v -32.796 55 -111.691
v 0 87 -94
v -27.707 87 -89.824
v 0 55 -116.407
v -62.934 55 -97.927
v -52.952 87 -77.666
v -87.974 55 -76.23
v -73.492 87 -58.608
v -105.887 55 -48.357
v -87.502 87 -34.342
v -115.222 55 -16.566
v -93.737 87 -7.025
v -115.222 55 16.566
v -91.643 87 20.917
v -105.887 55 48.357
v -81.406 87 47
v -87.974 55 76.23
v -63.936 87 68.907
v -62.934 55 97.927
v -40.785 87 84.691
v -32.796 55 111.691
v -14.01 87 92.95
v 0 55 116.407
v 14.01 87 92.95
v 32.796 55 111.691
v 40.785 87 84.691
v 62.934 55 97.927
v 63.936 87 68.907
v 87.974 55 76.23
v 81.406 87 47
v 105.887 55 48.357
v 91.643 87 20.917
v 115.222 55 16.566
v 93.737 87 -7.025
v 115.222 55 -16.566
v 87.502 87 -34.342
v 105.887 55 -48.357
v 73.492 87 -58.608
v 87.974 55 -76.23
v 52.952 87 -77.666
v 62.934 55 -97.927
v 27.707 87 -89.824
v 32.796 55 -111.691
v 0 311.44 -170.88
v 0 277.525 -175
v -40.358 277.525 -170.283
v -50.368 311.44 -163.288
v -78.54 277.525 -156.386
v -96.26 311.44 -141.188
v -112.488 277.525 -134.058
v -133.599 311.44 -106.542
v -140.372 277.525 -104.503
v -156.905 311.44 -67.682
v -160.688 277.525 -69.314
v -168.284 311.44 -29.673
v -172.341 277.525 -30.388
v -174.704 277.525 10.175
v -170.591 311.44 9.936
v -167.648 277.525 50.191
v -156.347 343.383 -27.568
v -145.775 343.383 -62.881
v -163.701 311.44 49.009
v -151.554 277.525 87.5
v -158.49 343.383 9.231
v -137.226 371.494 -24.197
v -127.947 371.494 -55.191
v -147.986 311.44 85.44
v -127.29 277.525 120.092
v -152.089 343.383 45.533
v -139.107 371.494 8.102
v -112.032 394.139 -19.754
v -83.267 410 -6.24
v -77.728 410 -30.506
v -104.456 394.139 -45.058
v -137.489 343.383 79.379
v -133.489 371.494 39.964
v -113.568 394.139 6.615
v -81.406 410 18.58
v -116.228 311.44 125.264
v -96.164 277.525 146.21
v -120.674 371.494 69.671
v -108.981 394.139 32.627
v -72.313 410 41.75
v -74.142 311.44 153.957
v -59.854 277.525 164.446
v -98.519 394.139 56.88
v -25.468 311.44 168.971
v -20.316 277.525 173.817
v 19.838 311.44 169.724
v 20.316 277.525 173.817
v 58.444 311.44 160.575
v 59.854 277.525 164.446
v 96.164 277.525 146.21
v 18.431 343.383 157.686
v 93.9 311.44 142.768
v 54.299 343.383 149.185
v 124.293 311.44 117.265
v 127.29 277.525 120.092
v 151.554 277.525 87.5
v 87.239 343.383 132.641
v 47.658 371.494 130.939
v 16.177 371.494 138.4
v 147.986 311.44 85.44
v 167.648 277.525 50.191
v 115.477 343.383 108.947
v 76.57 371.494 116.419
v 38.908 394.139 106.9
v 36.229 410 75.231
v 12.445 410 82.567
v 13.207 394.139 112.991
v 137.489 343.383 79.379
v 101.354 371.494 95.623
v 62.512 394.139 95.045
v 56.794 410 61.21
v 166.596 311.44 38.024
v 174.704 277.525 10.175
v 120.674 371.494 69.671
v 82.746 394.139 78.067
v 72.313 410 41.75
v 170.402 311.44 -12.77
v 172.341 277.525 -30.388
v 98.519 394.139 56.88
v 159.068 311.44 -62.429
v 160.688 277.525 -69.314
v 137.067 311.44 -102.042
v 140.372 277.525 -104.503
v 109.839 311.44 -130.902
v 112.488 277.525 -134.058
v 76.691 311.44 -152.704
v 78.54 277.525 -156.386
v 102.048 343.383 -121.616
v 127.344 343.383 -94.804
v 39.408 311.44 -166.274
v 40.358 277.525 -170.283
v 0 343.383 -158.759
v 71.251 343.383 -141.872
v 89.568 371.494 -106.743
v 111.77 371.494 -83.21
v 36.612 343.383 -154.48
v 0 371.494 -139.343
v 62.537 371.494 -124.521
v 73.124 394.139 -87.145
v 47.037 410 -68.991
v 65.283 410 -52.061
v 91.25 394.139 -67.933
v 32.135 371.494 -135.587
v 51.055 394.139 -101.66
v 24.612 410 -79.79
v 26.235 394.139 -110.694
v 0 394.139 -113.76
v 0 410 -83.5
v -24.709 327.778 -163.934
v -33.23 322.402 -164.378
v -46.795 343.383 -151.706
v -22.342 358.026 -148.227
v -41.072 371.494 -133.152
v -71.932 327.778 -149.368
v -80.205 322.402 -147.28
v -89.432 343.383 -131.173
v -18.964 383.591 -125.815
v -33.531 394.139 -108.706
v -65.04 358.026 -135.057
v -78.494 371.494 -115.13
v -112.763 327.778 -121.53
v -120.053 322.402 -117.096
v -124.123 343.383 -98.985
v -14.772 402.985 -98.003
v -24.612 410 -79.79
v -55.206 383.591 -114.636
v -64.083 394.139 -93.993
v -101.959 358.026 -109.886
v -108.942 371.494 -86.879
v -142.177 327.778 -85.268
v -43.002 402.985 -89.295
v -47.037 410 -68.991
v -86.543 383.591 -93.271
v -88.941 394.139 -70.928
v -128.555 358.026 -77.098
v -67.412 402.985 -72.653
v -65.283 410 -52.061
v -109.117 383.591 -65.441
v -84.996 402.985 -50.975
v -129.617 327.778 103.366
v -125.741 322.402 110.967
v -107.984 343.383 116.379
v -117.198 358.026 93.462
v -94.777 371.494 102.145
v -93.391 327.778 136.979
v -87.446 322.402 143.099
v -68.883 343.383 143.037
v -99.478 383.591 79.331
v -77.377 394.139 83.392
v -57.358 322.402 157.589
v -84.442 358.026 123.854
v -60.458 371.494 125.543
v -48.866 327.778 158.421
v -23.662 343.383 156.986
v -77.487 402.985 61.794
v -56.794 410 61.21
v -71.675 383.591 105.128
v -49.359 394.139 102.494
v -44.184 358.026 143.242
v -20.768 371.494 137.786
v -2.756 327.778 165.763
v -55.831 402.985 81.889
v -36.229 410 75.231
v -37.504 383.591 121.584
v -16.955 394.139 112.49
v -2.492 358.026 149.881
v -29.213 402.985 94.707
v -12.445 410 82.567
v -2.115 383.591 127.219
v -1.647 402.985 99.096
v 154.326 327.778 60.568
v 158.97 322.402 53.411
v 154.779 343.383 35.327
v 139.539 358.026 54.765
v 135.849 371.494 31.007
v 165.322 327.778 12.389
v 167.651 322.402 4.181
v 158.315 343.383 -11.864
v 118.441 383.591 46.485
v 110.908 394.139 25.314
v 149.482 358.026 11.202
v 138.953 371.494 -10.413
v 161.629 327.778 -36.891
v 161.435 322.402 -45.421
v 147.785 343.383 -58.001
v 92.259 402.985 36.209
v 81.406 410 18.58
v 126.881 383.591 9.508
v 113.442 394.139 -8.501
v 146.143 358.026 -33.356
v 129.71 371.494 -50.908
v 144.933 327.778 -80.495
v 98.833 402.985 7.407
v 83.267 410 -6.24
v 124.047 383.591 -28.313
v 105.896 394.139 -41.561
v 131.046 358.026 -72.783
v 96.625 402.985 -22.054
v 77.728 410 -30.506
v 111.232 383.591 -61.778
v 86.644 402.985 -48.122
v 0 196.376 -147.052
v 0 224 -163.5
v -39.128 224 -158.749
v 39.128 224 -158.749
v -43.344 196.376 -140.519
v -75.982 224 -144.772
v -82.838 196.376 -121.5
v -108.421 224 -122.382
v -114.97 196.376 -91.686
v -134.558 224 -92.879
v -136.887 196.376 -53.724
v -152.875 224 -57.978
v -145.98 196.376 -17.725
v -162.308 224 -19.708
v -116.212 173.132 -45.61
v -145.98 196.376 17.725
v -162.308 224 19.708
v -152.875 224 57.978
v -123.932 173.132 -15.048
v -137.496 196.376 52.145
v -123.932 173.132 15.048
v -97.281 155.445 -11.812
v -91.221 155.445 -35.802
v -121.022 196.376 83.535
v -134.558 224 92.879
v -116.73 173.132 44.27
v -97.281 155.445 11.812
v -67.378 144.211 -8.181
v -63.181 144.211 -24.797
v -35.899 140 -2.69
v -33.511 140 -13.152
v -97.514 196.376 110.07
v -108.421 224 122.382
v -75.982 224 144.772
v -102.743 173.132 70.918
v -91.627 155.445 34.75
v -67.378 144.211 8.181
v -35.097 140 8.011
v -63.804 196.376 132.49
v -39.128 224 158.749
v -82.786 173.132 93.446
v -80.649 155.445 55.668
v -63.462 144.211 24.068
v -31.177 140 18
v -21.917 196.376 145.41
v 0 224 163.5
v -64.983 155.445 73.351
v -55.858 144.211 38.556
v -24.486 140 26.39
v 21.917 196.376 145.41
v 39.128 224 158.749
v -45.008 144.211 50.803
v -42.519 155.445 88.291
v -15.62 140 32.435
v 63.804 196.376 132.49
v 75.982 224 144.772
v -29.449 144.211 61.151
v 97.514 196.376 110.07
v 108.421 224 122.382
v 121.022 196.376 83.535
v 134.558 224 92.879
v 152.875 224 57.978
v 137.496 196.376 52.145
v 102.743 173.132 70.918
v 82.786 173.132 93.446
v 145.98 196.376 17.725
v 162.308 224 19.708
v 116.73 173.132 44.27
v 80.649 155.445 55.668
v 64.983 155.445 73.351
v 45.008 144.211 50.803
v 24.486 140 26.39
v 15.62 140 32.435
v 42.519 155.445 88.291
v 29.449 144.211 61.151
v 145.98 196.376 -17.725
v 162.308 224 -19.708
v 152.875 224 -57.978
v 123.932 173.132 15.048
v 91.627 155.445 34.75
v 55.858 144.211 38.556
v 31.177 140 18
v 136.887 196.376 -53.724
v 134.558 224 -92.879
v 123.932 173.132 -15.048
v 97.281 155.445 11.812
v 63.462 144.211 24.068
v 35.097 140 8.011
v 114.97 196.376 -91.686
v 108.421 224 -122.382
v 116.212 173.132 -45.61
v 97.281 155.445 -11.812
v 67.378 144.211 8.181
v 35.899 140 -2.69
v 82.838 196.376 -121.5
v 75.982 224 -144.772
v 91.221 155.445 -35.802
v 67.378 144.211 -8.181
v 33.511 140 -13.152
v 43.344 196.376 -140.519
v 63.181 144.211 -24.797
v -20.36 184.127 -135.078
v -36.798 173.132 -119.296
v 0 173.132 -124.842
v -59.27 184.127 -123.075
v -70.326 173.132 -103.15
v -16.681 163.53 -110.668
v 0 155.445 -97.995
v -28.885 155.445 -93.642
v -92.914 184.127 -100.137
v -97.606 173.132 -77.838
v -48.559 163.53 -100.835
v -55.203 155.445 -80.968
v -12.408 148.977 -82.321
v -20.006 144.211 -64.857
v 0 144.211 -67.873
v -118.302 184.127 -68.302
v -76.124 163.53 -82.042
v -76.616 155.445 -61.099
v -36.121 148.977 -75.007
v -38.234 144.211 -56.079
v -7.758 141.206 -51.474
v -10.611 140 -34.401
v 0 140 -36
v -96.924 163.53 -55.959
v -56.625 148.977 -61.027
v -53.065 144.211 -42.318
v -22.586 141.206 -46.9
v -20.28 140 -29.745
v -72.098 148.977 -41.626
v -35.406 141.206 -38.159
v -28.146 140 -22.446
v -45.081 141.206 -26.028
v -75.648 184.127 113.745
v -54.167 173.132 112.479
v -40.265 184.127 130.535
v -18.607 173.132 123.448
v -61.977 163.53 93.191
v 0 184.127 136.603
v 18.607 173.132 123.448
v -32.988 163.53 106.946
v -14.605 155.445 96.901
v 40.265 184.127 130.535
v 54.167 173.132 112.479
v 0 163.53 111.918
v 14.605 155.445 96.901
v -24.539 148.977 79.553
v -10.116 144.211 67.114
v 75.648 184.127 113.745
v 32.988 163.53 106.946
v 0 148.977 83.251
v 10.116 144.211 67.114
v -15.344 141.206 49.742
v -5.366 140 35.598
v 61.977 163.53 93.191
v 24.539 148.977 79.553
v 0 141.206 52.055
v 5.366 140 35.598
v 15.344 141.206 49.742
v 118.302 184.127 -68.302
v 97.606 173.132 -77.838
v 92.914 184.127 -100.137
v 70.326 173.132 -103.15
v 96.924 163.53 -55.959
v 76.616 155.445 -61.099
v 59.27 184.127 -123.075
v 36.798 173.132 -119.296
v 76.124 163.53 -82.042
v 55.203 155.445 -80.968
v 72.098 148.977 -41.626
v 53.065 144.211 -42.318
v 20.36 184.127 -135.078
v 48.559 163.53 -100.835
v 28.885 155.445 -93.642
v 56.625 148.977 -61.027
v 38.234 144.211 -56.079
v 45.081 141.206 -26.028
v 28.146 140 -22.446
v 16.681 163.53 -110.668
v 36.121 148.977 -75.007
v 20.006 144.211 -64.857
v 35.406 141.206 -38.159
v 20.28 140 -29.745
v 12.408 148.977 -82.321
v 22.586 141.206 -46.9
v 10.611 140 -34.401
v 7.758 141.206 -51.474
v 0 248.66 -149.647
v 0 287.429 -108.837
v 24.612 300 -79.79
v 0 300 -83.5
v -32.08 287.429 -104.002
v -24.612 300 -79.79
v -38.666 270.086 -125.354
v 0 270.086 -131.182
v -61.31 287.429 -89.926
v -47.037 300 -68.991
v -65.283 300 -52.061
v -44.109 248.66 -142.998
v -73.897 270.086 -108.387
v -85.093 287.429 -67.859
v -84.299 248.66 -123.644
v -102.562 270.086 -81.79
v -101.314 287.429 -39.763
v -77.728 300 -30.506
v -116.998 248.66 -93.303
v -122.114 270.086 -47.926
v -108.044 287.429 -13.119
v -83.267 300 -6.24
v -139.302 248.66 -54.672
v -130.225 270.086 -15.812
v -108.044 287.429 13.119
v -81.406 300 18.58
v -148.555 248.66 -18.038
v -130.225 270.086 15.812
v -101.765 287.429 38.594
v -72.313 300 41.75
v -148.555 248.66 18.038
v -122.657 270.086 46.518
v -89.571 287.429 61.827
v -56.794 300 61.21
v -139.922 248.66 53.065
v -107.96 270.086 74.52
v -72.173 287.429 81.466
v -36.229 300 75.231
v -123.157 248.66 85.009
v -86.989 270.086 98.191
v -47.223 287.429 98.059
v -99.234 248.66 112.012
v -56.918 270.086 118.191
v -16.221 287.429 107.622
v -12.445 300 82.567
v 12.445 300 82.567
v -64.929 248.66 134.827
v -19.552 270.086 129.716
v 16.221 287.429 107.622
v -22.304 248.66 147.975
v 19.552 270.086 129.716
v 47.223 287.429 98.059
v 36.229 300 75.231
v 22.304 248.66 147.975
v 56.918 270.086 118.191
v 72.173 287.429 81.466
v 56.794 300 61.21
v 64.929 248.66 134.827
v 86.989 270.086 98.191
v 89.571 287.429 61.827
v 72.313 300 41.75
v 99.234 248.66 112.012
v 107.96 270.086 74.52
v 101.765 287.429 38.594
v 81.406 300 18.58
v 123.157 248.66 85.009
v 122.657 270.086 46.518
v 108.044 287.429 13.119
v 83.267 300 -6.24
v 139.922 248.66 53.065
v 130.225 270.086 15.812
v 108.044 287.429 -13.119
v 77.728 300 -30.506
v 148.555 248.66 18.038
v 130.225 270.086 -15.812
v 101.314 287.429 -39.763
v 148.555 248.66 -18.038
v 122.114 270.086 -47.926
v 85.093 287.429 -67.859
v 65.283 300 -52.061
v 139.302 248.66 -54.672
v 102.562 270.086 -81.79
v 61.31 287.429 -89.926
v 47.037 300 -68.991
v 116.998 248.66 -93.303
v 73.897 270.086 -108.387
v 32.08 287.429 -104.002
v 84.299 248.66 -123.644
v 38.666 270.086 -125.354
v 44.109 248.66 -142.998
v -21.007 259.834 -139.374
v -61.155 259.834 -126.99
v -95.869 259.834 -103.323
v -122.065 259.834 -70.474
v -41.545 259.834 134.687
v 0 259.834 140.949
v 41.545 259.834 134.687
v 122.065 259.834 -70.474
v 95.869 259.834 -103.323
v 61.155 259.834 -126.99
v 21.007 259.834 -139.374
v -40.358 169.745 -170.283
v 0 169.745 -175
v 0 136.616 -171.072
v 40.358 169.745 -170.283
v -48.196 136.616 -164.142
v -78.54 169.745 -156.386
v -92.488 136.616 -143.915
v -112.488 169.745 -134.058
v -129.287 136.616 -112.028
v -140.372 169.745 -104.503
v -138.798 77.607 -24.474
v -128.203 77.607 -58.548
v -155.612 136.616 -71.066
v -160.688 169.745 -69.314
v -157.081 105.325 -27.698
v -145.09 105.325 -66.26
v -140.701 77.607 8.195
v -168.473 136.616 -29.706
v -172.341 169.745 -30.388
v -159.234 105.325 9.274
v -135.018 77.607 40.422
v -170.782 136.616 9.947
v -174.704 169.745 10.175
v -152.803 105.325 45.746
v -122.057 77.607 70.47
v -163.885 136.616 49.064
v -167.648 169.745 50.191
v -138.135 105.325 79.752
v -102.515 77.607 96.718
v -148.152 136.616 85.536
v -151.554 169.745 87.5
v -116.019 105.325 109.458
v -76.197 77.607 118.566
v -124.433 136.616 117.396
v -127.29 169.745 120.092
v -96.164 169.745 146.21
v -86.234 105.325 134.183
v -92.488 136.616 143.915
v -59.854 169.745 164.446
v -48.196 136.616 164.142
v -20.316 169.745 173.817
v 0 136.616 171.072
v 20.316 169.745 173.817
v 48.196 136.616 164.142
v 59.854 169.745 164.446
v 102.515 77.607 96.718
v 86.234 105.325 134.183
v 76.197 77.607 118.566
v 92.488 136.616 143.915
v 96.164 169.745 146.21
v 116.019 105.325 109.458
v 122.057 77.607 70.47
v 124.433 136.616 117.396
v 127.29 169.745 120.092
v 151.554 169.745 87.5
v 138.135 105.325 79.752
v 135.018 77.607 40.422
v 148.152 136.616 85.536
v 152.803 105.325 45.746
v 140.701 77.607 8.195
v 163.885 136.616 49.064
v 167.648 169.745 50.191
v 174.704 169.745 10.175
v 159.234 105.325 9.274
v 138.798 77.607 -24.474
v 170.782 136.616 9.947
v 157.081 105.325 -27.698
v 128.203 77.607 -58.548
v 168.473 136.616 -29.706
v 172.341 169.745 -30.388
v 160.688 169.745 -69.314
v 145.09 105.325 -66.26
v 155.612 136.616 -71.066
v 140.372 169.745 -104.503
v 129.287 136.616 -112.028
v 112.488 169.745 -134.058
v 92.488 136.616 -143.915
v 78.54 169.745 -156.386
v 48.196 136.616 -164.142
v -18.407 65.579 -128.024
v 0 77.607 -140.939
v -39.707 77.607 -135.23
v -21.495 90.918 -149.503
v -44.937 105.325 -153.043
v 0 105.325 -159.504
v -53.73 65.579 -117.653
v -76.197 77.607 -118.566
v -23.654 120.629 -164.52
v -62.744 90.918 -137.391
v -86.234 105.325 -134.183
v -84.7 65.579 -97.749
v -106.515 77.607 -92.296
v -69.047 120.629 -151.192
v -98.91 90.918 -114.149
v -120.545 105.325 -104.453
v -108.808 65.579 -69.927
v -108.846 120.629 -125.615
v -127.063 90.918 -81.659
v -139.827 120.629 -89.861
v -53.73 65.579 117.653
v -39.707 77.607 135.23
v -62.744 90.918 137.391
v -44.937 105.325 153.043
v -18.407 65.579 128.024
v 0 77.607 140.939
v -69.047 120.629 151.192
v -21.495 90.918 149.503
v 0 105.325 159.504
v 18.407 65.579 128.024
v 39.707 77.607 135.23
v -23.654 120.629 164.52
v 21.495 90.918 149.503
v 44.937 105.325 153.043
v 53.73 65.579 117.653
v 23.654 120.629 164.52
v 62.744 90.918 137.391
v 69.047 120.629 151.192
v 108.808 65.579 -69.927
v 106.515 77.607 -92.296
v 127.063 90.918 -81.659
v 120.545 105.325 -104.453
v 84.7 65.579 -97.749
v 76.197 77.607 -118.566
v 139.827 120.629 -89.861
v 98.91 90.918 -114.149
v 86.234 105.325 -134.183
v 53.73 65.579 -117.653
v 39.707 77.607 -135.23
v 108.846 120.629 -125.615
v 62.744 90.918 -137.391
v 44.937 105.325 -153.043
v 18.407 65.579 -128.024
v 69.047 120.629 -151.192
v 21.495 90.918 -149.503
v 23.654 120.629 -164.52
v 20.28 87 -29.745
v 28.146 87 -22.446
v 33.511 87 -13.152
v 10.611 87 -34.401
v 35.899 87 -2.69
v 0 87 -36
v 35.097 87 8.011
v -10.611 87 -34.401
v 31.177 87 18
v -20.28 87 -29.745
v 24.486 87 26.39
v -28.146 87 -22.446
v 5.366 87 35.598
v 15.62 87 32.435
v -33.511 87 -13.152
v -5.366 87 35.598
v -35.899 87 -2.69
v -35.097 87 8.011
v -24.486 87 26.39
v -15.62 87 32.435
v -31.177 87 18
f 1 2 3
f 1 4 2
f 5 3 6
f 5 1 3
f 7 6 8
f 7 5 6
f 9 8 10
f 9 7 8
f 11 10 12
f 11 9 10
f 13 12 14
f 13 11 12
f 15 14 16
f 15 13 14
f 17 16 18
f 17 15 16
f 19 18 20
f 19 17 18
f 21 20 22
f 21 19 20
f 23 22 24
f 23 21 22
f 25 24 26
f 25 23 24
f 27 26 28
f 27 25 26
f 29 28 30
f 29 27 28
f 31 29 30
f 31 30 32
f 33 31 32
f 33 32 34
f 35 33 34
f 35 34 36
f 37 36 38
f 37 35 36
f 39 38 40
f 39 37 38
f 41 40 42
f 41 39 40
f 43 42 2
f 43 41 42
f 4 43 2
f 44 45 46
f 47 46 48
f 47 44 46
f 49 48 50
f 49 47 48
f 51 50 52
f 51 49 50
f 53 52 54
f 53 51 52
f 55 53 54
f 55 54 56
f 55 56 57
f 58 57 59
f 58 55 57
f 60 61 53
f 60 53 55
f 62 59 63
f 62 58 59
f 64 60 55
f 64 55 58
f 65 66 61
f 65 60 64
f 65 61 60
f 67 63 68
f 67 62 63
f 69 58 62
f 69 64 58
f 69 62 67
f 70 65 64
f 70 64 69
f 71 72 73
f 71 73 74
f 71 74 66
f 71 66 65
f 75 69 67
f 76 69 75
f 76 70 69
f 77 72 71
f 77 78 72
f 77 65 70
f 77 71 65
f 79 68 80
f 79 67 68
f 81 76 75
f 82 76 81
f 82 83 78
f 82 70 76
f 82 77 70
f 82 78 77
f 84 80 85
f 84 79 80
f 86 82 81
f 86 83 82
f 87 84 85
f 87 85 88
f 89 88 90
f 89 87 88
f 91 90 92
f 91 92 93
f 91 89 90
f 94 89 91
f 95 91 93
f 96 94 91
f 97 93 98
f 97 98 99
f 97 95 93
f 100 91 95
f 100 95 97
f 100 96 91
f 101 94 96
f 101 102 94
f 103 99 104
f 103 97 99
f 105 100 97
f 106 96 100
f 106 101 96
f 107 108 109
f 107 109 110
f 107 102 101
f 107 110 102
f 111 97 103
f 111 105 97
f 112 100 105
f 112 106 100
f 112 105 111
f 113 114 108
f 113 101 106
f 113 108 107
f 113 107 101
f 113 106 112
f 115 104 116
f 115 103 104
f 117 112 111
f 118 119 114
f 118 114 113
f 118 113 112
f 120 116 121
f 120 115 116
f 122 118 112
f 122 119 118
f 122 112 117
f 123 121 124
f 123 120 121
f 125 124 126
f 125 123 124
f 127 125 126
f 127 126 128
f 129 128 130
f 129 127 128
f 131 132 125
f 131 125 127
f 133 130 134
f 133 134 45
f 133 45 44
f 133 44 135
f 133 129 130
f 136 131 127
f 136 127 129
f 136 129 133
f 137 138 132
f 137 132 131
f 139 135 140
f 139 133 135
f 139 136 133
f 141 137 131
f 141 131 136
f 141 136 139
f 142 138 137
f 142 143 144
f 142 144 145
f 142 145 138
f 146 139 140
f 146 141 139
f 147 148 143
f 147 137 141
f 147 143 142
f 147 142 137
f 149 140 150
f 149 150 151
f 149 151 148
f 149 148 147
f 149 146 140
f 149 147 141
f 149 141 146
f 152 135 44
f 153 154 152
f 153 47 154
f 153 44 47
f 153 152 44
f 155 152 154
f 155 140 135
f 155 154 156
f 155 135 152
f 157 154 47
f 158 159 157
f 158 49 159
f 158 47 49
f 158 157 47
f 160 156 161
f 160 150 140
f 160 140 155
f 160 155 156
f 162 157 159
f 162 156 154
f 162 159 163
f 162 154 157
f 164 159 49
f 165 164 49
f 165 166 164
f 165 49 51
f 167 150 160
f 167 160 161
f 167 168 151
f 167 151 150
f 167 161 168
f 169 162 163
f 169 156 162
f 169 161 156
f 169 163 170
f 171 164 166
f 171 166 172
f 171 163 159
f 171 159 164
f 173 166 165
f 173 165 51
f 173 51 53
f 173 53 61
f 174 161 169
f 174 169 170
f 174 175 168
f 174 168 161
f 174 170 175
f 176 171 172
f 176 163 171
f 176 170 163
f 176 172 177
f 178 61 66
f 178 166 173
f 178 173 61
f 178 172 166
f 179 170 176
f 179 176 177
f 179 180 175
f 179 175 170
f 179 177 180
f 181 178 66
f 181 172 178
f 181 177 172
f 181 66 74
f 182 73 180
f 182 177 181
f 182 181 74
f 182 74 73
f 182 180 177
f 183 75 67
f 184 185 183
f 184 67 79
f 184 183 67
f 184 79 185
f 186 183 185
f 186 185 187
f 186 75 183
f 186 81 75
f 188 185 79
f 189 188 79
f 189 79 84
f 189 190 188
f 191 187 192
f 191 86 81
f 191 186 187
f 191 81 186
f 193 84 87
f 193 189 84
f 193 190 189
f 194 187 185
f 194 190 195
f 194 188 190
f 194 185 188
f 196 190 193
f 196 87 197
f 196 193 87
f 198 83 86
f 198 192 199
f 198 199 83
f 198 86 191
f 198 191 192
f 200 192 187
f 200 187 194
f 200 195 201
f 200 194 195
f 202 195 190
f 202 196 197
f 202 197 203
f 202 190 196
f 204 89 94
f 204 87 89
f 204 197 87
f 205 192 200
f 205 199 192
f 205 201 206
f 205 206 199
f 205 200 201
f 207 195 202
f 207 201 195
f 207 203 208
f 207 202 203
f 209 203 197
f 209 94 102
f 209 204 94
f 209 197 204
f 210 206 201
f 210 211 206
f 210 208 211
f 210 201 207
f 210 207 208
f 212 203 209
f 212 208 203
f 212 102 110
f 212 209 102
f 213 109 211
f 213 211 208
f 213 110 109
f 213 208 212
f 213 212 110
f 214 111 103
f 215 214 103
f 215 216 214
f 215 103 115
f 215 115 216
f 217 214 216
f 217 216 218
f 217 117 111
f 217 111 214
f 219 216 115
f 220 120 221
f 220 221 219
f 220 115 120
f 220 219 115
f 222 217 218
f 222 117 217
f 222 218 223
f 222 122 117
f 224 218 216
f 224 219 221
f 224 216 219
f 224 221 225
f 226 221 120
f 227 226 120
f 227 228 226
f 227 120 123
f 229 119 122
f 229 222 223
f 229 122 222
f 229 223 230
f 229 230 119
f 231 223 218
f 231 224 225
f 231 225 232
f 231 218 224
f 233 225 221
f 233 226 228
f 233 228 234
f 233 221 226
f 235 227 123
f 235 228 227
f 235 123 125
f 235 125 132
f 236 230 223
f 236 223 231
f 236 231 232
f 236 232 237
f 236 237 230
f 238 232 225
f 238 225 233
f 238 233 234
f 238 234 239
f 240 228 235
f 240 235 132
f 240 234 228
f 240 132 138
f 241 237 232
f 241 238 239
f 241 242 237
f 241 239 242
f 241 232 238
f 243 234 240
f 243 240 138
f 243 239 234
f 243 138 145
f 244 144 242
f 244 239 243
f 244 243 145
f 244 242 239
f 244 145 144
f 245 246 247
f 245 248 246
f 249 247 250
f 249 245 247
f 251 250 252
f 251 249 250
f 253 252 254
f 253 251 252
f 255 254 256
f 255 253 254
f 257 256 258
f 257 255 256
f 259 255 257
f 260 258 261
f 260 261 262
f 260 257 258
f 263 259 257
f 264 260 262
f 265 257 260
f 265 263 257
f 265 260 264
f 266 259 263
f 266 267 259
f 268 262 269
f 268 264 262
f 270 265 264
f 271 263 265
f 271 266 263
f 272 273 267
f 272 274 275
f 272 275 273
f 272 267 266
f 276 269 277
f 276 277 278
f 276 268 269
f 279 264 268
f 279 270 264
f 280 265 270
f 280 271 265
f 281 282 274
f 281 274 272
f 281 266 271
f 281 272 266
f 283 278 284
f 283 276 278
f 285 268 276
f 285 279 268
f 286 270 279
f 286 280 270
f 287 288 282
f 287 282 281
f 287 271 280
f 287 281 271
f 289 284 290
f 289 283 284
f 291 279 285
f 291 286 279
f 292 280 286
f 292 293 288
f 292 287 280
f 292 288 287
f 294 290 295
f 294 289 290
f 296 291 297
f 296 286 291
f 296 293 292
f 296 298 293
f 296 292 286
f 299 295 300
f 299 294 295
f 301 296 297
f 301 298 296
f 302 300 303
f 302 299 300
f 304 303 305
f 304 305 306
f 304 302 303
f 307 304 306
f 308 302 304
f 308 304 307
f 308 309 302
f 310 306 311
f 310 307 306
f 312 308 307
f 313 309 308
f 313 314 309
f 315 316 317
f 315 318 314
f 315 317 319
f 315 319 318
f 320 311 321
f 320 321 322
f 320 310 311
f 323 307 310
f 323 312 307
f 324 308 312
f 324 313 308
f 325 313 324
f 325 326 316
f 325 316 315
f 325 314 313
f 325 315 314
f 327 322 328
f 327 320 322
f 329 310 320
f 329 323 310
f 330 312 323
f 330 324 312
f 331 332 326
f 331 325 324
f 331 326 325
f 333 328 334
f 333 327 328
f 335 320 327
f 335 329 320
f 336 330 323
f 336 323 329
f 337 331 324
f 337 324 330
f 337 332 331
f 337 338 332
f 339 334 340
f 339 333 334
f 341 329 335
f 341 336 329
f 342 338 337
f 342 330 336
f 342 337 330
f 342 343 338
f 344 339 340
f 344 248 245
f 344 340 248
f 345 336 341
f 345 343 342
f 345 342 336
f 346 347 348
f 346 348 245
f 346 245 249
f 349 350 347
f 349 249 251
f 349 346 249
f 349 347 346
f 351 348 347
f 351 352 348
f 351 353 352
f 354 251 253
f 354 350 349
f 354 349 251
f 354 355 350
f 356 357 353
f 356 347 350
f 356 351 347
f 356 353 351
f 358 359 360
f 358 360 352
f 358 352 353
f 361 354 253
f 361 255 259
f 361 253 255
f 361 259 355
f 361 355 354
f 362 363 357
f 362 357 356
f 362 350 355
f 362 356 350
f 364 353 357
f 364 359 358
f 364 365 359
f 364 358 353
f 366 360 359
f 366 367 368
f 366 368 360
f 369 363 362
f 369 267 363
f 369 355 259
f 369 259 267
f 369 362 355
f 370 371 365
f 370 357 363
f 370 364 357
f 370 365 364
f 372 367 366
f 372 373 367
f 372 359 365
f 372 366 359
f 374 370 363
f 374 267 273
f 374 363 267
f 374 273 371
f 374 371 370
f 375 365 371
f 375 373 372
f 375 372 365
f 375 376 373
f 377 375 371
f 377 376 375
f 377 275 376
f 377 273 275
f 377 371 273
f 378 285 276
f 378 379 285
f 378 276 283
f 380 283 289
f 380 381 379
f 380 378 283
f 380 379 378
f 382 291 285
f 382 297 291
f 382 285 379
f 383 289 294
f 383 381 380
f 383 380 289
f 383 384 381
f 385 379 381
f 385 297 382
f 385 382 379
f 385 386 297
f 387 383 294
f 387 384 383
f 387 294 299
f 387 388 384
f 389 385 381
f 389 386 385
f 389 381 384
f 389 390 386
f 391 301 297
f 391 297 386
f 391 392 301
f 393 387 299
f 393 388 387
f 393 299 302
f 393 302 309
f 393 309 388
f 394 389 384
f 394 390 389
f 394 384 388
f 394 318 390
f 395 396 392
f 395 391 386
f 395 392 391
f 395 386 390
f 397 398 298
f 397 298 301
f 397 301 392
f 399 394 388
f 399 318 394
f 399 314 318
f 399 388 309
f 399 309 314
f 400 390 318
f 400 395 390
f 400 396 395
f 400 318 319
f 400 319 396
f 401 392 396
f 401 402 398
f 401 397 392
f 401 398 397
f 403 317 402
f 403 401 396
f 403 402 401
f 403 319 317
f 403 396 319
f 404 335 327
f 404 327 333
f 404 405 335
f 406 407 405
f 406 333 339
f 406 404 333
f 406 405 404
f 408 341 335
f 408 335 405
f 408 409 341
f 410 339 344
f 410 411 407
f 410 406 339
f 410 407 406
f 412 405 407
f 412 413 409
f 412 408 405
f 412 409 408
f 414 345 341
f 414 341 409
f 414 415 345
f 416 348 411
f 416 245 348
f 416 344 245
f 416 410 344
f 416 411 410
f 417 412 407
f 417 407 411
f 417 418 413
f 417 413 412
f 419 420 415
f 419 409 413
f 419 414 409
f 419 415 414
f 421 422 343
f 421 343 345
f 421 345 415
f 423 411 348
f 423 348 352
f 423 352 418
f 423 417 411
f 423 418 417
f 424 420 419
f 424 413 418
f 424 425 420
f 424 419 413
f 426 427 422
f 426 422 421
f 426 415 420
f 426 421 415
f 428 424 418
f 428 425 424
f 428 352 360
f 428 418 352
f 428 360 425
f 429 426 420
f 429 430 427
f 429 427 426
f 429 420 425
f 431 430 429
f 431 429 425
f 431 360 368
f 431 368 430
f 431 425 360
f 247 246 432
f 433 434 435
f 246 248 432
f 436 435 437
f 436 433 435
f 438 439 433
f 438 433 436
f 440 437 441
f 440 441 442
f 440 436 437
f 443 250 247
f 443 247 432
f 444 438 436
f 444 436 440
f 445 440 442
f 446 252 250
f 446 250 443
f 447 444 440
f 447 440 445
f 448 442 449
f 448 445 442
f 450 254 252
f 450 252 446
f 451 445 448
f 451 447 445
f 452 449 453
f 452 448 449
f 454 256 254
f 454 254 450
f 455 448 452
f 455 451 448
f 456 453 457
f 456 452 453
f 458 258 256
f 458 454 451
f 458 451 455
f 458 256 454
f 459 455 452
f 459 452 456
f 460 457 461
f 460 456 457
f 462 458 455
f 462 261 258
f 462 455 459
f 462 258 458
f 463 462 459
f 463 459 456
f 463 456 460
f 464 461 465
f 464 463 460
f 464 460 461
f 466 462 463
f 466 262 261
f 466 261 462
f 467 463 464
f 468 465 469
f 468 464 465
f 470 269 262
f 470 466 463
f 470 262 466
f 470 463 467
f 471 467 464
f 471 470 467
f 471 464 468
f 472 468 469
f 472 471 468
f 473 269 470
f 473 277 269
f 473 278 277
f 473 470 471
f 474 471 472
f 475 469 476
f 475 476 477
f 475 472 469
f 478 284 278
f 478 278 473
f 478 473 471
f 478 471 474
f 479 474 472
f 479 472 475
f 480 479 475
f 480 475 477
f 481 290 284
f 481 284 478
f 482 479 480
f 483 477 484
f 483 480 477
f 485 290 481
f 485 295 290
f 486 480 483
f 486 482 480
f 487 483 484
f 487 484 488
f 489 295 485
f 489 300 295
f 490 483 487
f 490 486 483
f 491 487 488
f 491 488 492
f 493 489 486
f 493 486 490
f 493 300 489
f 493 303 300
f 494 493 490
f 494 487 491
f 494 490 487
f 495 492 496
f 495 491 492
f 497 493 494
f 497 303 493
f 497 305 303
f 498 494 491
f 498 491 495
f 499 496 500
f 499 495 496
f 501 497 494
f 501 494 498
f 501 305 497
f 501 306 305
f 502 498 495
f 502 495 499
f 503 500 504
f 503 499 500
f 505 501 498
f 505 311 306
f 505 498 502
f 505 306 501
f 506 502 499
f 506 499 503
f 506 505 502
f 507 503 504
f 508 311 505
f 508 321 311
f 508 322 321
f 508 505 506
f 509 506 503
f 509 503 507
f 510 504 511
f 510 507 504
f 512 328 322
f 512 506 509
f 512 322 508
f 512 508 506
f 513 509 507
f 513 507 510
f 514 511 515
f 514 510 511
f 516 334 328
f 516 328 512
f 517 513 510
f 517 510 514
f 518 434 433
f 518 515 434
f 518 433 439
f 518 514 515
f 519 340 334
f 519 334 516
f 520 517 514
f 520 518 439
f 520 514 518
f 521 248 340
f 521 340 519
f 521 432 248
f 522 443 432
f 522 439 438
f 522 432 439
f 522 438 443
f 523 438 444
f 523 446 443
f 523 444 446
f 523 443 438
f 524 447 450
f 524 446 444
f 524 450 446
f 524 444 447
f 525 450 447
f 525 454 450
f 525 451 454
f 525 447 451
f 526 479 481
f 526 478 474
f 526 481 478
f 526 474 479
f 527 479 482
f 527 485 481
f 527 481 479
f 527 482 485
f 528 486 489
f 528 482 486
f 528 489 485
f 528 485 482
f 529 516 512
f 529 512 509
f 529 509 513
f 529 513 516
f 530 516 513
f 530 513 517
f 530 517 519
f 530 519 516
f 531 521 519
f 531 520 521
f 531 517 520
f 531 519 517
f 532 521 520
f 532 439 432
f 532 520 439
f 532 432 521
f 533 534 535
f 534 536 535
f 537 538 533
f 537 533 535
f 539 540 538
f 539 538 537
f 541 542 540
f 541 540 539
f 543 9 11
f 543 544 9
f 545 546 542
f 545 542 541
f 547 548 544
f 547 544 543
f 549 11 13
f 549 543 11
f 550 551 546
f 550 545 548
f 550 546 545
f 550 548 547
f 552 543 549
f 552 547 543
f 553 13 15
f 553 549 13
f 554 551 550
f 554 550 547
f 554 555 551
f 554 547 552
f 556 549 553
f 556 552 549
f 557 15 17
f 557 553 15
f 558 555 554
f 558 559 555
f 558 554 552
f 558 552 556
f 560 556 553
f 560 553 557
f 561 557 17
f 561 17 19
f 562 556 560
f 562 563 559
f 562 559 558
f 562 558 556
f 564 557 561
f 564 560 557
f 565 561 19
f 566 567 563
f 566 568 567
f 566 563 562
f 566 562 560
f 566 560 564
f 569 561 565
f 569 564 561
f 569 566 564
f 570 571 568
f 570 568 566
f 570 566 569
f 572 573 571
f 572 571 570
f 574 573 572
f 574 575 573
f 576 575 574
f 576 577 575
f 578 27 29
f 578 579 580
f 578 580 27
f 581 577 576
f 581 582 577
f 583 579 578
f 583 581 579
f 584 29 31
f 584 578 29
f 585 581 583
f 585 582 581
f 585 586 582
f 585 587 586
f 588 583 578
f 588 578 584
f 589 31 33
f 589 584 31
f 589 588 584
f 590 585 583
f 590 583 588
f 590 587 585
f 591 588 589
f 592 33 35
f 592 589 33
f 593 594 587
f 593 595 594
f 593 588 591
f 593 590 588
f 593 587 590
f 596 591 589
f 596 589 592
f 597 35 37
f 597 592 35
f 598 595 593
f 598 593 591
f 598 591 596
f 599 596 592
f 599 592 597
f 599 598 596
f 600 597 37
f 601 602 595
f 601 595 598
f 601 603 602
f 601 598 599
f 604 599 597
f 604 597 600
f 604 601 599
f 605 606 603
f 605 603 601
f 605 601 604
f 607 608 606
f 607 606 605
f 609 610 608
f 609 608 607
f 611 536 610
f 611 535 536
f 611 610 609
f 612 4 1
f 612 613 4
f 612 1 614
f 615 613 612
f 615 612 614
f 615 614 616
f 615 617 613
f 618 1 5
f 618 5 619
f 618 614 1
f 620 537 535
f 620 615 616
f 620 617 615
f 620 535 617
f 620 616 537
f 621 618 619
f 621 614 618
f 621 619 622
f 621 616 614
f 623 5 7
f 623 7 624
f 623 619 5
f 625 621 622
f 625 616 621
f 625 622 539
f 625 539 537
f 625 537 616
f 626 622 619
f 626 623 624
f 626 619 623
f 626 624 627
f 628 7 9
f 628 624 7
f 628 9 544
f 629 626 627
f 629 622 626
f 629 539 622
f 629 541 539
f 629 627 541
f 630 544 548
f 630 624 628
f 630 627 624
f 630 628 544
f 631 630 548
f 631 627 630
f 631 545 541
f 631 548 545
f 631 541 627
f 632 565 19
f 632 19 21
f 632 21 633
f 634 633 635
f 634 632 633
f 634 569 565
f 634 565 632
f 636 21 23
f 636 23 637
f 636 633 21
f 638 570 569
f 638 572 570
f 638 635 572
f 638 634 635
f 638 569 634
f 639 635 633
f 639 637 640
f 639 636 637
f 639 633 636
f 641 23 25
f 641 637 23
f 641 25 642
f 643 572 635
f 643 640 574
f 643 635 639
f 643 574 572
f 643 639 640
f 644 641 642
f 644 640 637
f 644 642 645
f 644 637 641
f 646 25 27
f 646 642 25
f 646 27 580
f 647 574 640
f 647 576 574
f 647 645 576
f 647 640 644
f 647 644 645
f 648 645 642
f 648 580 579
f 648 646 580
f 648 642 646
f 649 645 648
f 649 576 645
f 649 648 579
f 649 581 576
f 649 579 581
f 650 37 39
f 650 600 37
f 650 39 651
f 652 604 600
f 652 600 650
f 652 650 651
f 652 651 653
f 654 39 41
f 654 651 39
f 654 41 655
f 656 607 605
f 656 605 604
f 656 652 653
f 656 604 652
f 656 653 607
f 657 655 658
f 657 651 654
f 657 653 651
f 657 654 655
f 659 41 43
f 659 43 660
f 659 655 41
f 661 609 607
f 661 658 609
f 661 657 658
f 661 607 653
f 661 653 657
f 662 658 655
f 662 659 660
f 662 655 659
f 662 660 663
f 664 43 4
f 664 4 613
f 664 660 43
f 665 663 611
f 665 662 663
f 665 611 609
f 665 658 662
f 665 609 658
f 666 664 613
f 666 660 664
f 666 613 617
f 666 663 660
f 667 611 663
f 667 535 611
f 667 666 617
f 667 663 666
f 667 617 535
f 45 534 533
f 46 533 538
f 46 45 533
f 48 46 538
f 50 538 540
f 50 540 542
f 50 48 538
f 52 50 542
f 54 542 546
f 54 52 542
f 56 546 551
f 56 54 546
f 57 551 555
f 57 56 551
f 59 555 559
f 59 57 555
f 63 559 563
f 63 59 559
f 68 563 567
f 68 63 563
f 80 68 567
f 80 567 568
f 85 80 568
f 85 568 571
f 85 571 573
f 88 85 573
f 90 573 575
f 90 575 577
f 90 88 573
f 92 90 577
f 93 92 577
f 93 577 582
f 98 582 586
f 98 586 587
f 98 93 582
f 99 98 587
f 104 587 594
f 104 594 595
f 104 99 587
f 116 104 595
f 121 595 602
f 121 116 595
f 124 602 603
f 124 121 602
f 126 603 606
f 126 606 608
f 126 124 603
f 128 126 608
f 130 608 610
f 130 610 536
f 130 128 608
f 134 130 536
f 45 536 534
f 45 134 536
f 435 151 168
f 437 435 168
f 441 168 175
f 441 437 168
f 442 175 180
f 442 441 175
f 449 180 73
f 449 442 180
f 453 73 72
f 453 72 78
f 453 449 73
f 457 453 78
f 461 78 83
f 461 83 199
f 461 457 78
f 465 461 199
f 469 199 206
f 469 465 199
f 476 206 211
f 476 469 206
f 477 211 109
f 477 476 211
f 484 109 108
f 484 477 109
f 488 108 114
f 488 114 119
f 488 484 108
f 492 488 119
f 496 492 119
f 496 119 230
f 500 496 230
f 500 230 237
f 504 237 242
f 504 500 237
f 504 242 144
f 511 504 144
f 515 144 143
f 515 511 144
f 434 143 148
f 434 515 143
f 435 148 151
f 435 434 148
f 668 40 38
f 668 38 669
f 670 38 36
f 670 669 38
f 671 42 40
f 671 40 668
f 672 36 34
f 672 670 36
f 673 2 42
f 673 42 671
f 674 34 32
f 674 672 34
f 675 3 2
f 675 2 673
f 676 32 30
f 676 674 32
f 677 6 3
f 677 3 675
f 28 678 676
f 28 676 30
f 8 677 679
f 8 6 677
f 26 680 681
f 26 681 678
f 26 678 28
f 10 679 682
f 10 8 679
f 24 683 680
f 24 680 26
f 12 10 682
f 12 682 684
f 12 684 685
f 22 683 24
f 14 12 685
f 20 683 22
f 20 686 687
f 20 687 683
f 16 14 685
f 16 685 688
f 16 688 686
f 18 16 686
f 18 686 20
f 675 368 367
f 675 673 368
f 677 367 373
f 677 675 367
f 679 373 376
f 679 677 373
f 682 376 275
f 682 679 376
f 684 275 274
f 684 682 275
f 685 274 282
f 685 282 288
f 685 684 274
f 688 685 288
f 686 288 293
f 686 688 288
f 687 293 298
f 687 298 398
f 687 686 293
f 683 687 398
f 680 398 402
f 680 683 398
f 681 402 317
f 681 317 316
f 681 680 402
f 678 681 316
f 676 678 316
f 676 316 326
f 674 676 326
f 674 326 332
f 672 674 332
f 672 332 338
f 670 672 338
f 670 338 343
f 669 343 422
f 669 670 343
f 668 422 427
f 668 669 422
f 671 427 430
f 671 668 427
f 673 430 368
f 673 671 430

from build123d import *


with BuildPart() as part:
    # Skizze1 → Rotation1 (revolve)
    with BuildSketch(Plane.XY, mode=Mode.PRIVATE) as rotation1_sk:
        with BuildLine():
            Line((-83.5, 410), (-83.5, 300))
            ThreePointArc((-83.5, 300), (-131.181602767, 270.08589765), (-163.5, 224))
            ThreePointArc((-163.5, 224), (-111.918186946, 163.530430528), (-36, 140))
            Line((-36, 140), (-36, 87))
            Line((-36, 87), (-94, 87))
            Line((-94, 87), (-116.406641223, 55))
            ThreePointArc((-116.406641223, 55), (-159.504064003, 105.325051589), (-175, 169.744572198))
            Line((-175, 169.744572198), (-175, 277.524719287))
            ThreePointArc((-175, 277.524719287), (-149.901426418, 358.026194429), (-83.5, 410))
        make_face()
    revolve(rotation1_sk.sketch.rotate(Axis((0, 0, 0), (0, 1, 0)), 270), axis=Axis((0, 0, 0), (0, 1, 0)))  # turned: the seam where the file's is


solid = part.part
